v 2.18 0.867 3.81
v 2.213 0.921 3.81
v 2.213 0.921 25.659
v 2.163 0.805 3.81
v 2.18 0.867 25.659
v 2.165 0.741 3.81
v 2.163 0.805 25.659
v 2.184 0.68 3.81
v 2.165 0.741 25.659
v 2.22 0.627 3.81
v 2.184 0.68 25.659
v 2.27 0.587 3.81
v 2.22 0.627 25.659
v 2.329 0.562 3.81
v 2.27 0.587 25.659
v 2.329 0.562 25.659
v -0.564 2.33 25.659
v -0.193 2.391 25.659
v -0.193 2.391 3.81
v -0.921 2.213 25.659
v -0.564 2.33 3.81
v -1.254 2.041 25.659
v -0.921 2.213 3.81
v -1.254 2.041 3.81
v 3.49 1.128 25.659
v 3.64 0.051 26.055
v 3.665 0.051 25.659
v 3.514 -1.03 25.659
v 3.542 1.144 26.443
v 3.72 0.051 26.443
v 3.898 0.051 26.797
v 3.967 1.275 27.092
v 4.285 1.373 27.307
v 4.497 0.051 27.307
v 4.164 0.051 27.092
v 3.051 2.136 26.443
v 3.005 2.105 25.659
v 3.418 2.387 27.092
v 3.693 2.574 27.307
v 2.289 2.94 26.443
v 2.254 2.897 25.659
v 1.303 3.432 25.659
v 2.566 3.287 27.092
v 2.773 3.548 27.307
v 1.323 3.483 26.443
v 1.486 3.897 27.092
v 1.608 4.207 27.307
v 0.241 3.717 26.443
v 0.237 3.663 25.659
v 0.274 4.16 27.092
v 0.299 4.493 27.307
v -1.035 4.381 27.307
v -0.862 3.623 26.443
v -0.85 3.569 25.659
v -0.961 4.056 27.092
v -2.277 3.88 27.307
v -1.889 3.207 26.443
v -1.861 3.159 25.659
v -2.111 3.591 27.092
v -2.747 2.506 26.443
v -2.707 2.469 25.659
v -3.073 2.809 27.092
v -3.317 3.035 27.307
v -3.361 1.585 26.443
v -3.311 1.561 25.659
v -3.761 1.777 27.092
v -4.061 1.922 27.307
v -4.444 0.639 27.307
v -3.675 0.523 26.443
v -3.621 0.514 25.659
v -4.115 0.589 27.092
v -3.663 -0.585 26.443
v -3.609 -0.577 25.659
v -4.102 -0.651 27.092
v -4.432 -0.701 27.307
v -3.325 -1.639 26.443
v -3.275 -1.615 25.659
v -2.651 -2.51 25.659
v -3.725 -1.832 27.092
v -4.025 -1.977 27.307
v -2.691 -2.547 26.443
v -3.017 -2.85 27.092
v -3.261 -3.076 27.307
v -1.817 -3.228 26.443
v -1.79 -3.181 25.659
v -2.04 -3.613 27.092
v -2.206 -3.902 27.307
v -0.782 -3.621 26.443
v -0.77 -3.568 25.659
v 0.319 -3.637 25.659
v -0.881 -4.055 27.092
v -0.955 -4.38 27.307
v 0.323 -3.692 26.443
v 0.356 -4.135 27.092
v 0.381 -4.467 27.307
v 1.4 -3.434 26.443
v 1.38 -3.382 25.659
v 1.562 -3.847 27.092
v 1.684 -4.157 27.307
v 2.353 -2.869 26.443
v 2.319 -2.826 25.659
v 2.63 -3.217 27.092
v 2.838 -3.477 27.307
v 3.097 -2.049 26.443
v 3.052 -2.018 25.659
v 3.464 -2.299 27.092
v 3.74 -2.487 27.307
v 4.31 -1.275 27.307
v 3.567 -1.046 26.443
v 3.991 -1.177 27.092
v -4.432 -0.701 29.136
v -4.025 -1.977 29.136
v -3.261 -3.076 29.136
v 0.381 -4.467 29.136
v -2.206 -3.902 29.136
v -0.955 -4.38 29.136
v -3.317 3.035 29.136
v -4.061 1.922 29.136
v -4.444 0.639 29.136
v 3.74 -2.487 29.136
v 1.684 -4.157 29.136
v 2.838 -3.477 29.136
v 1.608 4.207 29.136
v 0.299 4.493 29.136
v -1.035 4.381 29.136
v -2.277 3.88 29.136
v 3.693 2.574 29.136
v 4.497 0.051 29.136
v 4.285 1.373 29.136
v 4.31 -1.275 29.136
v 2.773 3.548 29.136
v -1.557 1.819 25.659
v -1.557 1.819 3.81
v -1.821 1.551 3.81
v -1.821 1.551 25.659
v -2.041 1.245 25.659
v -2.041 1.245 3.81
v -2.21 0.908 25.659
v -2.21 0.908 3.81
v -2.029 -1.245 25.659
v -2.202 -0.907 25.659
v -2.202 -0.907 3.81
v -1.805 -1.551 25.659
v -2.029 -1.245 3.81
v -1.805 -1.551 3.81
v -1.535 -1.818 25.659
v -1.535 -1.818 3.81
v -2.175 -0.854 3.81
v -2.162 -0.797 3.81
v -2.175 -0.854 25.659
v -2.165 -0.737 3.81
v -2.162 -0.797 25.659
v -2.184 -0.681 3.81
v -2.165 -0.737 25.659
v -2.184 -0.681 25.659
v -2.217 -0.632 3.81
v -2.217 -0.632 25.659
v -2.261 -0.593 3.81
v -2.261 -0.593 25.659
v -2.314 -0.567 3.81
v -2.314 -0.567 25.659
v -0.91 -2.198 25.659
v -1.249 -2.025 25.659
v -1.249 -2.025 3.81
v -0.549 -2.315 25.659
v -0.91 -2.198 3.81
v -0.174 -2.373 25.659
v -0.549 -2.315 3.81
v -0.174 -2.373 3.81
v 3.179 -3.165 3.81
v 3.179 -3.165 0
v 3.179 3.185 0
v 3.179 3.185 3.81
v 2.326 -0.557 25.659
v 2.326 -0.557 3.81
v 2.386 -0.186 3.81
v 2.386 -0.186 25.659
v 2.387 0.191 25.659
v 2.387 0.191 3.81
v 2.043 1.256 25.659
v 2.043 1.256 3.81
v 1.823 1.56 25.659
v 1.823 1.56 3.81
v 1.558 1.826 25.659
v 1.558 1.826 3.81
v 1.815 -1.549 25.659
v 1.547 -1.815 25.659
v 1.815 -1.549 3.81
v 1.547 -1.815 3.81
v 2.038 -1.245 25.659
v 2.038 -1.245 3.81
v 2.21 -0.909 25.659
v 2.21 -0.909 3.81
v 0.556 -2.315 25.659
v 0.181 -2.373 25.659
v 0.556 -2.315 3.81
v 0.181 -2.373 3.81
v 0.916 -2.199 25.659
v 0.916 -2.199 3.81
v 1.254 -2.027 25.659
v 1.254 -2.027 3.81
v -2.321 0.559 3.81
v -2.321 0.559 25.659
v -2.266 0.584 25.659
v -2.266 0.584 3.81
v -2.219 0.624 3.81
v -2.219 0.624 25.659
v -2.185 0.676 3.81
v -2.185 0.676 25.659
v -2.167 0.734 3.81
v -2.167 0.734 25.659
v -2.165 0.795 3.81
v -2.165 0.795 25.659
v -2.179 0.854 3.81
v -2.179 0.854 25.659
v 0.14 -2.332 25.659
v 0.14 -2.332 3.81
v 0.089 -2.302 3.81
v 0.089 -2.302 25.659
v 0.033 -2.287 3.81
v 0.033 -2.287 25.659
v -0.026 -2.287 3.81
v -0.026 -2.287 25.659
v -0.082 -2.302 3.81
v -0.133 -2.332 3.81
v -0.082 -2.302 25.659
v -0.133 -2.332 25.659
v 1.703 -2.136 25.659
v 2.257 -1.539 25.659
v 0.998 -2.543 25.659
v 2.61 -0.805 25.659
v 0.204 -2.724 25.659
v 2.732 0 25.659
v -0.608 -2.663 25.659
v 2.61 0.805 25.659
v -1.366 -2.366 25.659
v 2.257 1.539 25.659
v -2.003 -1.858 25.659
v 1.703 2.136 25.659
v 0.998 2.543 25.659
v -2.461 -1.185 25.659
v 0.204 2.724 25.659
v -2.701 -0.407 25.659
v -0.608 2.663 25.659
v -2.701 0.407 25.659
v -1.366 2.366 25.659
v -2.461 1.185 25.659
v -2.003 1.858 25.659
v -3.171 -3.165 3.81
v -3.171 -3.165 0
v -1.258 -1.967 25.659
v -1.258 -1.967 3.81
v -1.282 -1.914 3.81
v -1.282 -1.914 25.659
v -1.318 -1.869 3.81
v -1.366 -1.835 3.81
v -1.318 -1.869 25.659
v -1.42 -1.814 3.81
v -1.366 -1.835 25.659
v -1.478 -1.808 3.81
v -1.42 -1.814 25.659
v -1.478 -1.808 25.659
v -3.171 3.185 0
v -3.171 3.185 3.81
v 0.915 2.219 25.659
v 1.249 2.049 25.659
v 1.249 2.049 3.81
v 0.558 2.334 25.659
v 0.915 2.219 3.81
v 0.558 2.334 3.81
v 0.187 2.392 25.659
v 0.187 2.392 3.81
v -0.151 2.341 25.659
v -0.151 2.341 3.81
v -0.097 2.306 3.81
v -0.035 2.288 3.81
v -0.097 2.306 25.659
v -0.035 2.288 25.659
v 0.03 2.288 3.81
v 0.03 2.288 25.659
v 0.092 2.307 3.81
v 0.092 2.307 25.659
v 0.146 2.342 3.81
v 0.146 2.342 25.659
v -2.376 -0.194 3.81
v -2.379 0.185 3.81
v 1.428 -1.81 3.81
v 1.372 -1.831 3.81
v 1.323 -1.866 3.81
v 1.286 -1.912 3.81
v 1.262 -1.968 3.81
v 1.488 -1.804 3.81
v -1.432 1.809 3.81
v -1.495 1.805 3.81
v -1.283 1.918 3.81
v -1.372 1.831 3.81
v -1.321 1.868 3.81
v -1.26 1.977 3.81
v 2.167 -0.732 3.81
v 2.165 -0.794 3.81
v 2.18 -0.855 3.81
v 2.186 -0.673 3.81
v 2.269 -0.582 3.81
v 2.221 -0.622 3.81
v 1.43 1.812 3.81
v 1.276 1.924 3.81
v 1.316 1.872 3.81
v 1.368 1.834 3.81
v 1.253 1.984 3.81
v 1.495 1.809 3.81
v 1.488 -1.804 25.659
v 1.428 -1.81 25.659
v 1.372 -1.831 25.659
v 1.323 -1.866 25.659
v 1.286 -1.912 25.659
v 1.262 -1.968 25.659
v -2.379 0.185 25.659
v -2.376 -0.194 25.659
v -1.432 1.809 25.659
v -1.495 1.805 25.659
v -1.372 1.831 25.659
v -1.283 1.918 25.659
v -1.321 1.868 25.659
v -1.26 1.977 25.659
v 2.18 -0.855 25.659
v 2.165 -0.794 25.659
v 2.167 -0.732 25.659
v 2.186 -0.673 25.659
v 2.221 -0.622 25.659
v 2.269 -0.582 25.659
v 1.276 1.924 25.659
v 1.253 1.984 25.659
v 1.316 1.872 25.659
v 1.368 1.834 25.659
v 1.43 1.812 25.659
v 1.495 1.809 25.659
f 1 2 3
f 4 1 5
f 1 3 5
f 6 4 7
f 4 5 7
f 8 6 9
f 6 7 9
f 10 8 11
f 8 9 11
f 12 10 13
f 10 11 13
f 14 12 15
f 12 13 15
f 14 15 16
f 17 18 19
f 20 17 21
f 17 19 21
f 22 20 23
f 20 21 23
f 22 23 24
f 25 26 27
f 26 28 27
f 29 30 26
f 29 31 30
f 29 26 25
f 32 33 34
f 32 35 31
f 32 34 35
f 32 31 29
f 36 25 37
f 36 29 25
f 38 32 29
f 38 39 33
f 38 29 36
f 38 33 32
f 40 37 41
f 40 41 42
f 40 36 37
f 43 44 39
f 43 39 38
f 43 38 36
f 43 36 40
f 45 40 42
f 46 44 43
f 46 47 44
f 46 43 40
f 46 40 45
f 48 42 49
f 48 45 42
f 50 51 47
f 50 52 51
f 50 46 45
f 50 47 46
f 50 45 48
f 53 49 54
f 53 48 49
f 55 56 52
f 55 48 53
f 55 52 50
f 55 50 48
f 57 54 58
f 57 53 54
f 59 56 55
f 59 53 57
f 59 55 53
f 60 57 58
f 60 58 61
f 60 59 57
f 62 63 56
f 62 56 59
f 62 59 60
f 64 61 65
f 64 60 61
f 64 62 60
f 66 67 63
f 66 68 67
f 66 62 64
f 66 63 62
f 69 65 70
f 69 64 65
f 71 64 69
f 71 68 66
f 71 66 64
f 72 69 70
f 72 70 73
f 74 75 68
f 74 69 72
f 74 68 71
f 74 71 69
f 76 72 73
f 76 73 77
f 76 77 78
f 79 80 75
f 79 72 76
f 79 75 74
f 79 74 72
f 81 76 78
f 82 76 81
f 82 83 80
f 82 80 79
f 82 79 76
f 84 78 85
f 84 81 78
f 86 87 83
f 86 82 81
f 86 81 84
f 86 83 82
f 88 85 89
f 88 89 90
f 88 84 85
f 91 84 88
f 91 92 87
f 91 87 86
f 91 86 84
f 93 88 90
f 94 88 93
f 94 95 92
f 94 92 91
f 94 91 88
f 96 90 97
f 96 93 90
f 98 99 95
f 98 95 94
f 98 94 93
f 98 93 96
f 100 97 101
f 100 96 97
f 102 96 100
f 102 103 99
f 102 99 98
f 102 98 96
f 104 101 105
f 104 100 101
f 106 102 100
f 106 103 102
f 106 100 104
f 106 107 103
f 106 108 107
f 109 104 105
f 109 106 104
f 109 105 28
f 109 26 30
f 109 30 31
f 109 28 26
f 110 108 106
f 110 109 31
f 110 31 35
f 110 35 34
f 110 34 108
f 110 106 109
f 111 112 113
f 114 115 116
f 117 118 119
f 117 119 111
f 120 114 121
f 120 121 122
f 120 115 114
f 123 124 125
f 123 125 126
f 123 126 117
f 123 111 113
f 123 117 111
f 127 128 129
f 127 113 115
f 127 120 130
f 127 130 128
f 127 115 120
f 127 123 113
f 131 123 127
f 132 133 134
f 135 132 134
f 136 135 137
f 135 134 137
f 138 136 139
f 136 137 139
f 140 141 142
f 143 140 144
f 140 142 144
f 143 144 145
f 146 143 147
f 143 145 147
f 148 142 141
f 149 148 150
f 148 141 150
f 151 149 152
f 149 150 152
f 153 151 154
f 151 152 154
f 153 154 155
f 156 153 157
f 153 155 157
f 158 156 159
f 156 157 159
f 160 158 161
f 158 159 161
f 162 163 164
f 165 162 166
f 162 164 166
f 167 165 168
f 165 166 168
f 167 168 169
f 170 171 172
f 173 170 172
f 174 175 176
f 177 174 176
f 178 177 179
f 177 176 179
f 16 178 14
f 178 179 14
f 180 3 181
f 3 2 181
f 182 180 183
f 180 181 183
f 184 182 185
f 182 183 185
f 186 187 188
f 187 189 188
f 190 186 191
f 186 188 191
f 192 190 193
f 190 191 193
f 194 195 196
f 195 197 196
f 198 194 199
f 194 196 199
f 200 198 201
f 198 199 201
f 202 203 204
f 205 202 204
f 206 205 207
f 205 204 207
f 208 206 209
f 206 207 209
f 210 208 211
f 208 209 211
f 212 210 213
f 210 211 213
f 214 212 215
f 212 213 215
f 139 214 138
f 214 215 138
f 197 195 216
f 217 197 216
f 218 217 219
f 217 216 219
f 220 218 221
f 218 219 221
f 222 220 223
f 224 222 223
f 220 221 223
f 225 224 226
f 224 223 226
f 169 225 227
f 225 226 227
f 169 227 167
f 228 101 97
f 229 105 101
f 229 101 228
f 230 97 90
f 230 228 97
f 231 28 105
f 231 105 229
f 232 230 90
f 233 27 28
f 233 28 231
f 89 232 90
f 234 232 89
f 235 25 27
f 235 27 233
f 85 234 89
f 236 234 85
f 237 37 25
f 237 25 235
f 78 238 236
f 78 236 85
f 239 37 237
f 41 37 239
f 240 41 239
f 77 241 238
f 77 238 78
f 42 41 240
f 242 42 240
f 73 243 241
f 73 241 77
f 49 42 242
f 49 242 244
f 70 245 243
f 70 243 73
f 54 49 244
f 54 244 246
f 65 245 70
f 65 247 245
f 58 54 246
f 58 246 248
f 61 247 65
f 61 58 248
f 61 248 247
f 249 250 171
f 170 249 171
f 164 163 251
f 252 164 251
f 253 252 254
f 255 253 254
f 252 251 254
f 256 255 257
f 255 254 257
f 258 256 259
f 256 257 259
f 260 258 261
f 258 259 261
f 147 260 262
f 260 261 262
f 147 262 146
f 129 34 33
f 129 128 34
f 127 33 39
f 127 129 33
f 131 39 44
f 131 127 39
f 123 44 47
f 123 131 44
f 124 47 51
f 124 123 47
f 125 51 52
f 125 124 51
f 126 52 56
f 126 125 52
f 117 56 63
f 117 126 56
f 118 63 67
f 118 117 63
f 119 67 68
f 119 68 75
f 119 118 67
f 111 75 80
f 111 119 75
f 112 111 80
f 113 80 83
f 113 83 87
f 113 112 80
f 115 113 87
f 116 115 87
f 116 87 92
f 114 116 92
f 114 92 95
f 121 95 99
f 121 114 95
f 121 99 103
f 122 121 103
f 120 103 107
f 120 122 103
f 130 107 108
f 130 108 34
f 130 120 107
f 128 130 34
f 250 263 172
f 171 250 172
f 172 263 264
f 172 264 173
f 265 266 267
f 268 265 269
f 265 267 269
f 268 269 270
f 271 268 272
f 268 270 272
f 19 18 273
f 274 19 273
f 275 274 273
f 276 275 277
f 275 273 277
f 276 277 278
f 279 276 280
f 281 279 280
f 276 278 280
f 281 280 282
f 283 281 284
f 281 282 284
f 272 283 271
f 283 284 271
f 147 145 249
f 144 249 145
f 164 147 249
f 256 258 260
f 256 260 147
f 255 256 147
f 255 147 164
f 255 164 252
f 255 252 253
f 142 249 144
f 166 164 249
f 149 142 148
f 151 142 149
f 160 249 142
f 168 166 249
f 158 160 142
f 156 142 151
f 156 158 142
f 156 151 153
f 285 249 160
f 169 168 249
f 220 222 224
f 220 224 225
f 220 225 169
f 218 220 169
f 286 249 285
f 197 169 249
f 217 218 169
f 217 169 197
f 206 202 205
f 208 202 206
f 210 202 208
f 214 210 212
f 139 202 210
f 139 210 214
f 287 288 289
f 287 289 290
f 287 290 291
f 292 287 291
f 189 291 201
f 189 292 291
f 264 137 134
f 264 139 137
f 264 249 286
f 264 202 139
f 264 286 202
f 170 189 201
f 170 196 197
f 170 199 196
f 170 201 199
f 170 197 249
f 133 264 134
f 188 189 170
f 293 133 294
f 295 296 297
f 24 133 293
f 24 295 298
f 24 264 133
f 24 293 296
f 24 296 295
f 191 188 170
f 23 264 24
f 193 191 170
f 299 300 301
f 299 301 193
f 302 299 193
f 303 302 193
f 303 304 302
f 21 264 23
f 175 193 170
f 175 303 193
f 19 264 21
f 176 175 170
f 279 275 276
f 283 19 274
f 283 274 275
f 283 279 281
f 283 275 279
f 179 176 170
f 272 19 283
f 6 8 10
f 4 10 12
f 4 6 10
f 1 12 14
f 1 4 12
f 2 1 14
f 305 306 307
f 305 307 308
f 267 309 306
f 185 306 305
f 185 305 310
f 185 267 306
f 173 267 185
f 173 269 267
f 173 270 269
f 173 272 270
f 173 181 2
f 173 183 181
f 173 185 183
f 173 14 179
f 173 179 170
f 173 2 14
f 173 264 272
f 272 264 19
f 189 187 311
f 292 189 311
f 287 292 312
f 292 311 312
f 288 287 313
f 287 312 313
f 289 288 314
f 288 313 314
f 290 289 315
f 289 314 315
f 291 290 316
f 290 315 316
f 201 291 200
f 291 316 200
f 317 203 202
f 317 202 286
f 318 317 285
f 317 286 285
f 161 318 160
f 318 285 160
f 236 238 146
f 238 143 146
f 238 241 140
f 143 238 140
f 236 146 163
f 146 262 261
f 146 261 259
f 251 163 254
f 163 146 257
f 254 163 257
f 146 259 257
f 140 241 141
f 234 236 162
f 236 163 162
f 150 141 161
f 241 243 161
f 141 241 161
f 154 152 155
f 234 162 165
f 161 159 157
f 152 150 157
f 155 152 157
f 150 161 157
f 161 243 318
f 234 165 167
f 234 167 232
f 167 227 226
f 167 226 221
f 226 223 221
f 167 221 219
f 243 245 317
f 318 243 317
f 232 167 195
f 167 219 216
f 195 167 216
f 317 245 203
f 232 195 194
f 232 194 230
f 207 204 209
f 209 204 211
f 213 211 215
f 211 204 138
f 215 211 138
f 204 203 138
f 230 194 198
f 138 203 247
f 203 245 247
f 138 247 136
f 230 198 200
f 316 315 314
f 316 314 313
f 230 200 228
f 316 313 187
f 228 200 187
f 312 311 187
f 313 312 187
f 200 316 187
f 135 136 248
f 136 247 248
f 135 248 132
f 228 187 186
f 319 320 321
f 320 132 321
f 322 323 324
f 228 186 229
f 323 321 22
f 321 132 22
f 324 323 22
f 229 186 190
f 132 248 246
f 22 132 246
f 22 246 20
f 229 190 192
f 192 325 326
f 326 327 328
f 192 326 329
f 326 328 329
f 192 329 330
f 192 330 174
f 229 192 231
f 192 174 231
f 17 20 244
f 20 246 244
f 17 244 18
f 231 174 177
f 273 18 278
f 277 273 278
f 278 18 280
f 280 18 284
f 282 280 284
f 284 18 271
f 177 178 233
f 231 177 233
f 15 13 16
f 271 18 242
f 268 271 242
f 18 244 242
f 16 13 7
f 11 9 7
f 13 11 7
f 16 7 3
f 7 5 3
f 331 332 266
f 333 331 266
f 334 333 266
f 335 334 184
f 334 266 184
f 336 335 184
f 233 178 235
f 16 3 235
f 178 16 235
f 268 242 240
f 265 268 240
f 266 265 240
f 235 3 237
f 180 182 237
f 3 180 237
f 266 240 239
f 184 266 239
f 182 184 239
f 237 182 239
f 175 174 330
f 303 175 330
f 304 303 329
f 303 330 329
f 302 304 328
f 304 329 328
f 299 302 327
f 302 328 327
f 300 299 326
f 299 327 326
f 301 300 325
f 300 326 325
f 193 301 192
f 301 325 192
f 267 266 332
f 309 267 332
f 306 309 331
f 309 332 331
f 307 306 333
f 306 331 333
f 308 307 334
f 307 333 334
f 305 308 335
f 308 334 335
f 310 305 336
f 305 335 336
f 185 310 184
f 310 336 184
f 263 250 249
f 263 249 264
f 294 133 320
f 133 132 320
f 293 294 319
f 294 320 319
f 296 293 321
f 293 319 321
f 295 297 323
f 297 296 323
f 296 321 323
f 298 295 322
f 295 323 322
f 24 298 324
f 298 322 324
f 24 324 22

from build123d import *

# Parameters (mm, degrees)
F0_W      = 6.35
F0_H      = 6.35
F1_DEPTH  = 3.81
F2_R      = 2.3894248051
F3_DEPTH  = 25.4
F8_R      = 0.2232162281
F9_DEPTH  = 25.4
F10_R     = 2.7317429941
F11_DEPTH = 3.4770822
F12_W     = 5.8086237404
F12_H     = 6.0867127031
F13_DEPTH = 25.4


with BuildPart() as f1:
    # F0 (on Top) → F1 (new body)
    with BuildSketch(Plane.XY):
        with Locations((2.5444868952, -10.8615327454)):
            Rectangle(F0_W, F0_H)
    extrude(amount=F1_DEPTH)

    # F2 (on face) → F3 (join)
    with BuildSketch(Plane.XY.offset(3.81)):
        with Locations((2.5444868952, -10.8615327454)):
            Circle(F2_R)
    extrude(amount=F3_DEPTH)


with BuildPart() as f1_1:
    # F4: moved
    add(f1.part.moved(Location((-2.4892, 10.8204, 0))))

    # F5 (on Front) → F6 (revolve)
    with BuildSketch(Plane.XZ):
        with BuildLine():
            Line((3.715344239, 29.1360206902), (2.3982734419, 29.1360206902))
            Line((2.3982734419, 29.1360206902), (2.3982734419, 25.658948347))
            Line((2.3982734419, 25.658948347), (3.715344239, 25.658948347))
            ThreePointArc((3.715344239, 25.658948347), (3.8481047551, 26.626173701), (4.5479801483, 27.3068532688))
            Line((4.5479801483, 27.3068532688), (4.5479801483, 29.1360206902))
            Line((4.5479801483, 29.1360206902), (3.715344239, 29.1360206902))
        make_face()
    revolve(axis=Axis((0.0552868952, -0.0411327454, 29.21), (0, 0, 1)))


with BuildPart() as f1_2:
    # F7: moved
    add(f1_1.part.moved(Location((-0.0508, 0.0508, 0))))

    # F8 (on face) → F9 (cut)
    with BuildSketch(Plane.XY.offset(29.21)):
        with BuildLine():
            ThreePointArc((0.2196997185, 2.5085243013), (-0.06466925, 2.7232003988), (-0.1932256967, 2.3908981612))
            ThreePointArc((-0.1932256967, 2.3908981612), (-0.0028015905, 2.2853092181), (0.1869422498, 2.3921157731))
            ThreePointArc((0.1869422498, 2.3921157731), (0.2113543474, 2.4480594413), (0.2196997185, 2.5085243013))
        make_face()
        with Locations((-1.4773185054, 2.027371838)):
            Circle(F8_R)
        with Locations((-2.3868350443, 0.7718322405)):
            Circle(F8_R)
        with Locations((-2.3846617218, -0.7785210393)):
            Circle(F8_R)
        with Locations((-1.4716286733, -2.031505743)):
            Circle(F8_R)
        with Locations((0.0035165096, -2.5085243013)):
            Circle(F8_R)
        with Locations((1.4773185054, -2.027371838)):
            Circle(F8_R)
        with Locations((2.3868350443, -0.7718322405)):
            Circle(F8_R)
        with Locations((2.3846617218, 0.7785210393)):
            Circle(F8_R)
        with Locations((1.4716286733, 2.031505743)):
            Circle(F8_R)
    extrude(amount=-F9_DEPTH, mode=Mode.SUBTRACT)

    # F10 (on face) → F11 (join)
    with BuildSketch(Plane.XY.offset(29.1360206902)):
        Circle(F10_R)
    extrude(amount=-F11_DEPTH)

    # F12 (on face) → F13 (cut)
    with BuildSketch(Plane.XY.offset(29.1360206902)):
        with Locations((0.0104332576, 0.1239965204)):
            Rectangle(F12_W, F12_H)
    extrude(amount=F13_DEPTH, mode=Mode.SUBTRACT)


solid = f1_2.part
